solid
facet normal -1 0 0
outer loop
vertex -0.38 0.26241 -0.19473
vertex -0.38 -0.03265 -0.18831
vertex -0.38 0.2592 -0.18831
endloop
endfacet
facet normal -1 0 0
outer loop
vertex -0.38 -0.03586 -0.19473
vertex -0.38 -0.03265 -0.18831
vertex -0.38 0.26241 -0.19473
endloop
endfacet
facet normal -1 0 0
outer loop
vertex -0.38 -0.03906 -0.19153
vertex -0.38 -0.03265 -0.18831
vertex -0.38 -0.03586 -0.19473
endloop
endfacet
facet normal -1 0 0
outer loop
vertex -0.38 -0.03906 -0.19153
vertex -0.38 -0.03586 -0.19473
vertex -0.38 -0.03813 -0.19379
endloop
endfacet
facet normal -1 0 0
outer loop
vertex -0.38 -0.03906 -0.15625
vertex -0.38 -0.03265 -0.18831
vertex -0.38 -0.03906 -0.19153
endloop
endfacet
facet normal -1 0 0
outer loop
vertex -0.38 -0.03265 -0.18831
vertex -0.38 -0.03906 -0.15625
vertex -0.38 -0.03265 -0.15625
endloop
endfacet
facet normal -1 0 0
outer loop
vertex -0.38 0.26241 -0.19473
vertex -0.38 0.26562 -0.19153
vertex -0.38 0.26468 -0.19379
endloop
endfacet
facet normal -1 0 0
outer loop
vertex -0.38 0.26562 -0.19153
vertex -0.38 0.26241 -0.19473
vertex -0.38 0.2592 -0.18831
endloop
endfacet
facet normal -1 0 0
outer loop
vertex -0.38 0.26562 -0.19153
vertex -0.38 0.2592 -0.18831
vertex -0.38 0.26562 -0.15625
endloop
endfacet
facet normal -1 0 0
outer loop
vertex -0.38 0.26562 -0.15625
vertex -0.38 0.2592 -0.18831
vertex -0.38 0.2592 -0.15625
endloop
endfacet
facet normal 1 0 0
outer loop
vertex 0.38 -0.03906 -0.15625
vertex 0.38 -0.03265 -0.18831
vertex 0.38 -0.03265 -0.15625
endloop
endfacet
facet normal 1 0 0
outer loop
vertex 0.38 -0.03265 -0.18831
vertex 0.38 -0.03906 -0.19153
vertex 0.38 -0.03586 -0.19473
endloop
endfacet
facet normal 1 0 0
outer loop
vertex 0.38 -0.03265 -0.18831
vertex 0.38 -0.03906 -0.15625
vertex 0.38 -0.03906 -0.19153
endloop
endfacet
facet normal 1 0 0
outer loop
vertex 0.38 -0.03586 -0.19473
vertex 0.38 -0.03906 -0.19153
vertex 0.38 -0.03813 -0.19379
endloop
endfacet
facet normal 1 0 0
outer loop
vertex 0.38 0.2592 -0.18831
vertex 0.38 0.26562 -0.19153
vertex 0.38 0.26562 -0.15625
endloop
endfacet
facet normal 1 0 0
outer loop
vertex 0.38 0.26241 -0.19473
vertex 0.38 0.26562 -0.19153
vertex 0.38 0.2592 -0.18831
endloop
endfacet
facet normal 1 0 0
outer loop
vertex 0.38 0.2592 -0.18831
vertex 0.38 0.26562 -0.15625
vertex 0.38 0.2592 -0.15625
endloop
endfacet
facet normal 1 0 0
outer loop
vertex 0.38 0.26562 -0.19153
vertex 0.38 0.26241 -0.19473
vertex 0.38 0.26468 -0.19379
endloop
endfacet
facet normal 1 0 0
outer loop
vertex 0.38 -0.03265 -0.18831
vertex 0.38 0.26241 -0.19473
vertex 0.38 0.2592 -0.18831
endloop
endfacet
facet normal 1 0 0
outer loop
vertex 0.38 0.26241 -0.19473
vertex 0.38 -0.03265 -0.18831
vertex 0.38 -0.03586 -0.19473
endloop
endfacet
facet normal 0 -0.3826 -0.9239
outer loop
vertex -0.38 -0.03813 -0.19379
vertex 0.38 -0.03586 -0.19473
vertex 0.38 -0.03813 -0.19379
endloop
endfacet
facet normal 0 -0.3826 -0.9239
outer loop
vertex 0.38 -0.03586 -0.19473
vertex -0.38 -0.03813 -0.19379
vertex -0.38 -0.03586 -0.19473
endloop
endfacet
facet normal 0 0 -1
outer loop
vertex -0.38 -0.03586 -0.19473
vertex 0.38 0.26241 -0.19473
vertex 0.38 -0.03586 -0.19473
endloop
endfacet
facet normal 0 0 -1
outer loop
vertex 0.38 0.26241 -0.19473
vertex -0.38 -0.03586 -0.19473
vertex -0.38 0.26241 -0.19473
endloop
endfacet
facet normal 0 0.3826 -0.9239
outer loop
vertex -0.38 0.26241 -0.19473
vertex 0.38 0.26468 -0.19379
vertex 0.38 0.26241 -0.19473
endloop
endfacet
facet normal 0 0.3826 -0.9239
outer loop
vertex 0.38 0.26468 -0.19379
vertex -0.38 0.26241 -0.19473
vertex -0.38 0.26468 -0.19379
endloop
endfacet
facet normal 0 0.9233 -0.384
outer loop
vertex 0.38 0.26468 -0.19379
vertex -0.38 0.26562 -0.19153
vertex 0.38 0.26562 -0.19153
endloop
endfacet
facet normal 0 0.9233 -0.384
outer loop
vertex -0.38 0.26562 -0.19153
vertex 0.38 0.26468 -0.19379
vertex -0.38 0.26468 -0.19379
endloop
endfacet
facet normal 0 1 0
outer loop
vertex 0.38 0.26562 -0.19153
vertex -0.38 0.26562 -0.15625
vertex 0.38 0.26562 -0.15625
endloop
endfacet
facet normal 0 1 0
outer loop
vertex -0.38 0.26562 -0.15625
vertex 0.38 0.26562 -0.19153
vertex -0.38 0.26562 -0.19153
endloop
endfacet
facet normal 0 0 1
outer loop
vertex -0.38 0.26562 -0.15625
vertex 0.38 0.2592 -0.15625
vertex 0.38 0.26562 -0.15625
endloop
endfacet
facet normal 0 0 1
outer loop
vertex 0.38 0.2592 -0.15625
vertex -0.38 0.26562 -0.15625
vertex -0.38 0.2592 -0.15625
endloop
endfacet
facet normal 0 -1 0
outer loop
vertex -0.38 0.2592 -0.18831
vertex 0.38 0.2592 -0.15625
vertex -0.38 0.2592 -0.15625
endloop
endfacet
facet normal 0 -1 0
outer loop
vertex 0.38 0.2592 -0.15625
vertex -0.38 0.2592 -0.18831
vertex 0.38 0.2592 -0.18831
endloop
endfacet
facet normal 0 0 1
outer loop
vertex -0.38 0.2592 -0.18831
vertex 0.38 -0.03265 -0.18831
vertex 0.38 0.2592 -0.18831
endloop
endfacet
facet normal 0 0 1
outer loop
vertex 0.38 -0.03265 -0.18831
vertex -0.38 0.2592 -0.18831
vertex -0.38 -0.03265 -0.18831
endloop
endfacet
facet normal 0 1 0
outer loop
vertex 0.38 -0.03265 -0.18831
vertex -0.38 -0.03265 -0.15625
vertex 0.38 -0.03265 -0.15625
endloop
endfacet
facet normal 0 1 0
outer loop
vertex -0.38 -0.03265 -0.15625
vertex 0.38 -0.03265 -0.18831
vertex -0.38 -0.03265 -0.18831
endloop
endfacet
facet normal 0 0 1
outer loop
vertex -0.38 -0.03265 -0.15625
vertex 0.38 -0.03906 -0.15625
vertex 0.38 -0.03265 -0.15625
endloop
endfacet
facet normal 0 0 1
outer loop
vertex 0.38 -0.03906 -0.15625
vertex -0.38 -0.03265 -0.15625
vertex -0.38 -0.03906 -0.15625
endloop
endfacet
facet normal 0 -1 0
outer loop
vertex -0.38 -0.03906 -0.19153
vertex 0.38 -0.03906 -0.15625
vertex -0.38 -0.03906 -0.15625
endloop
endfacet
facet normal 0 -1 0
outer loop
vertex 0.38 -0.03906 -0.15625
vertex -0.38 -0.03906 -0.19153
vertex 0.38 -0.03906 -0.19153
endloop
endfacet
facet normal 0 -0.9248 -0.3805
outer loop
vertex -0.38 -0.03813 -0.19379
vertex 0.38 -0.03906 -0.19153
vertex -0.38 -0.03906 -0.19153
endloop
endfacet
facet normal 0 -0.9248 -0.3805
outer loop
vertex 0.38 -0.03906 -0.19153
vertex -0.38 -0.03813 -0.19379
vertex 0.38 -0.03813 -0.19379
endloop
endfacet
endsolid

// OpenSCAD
EPS = 0.01;

module sketch0() {
    translate([0, -0.0390625, -0.15625])
    rotate([0, 90, 0])
    linear_extrude(height=0.75 + EPS, center=true)
    polygon(points=[
        [0.0352796052631579, 0.0],
        [0.03754746418308187, 0.0009393779221812848],
        [0.03848684210526316, 0.003207236842105263],
        [0.03848684210526316, 0.3014802631578947],
        [0.03754746418308187, 0.3037481220778187],
        [0.0352796052631579, 0.3046875],
        [0.0, 0.3046875],
        [0.0, 0.29827302631578945],
        [0.032072368421052634, 0.29827302631578945],
        [0.032072368421052634, 0.006414473684210526],
        [0.0, 0.006414473684210526],
        [0.0, 0.0]
    ]);
}

module sketch1() {
    translate([0.75, 0, 0.125])
    rotate([0, 90, 0])
    linear_extrude(height=-0.0234375 - EPS)
    circle(r=0.011842105263157895);
}

module sketch2() {
    translate([0.75, 0, -0.125])
    rotate([0, 90, 0])
    linear_extrude(height=-0.0234375 - EPS)
    circle(r=0.011842105263157895);
}

module sketch3() {
    translate([-0.7265625, 0, 0.125])
    rotate([0, 90, 0])
    linear_extrude(height=-0.0234375 - EPS)
    circle(r=0.011842105263157895);
}

module sketch4() {
    translate([-0.7265625, 0, -0.125])
    rotate([0, 90, 0])
    linear_extrude(height=-0.0234375 - EPS)
    circle(r=0.011842105263157895);
}

difference() {
    sketch0();
    sketch1();
    sketch2();
    sketch3();
    sketch4();
}
